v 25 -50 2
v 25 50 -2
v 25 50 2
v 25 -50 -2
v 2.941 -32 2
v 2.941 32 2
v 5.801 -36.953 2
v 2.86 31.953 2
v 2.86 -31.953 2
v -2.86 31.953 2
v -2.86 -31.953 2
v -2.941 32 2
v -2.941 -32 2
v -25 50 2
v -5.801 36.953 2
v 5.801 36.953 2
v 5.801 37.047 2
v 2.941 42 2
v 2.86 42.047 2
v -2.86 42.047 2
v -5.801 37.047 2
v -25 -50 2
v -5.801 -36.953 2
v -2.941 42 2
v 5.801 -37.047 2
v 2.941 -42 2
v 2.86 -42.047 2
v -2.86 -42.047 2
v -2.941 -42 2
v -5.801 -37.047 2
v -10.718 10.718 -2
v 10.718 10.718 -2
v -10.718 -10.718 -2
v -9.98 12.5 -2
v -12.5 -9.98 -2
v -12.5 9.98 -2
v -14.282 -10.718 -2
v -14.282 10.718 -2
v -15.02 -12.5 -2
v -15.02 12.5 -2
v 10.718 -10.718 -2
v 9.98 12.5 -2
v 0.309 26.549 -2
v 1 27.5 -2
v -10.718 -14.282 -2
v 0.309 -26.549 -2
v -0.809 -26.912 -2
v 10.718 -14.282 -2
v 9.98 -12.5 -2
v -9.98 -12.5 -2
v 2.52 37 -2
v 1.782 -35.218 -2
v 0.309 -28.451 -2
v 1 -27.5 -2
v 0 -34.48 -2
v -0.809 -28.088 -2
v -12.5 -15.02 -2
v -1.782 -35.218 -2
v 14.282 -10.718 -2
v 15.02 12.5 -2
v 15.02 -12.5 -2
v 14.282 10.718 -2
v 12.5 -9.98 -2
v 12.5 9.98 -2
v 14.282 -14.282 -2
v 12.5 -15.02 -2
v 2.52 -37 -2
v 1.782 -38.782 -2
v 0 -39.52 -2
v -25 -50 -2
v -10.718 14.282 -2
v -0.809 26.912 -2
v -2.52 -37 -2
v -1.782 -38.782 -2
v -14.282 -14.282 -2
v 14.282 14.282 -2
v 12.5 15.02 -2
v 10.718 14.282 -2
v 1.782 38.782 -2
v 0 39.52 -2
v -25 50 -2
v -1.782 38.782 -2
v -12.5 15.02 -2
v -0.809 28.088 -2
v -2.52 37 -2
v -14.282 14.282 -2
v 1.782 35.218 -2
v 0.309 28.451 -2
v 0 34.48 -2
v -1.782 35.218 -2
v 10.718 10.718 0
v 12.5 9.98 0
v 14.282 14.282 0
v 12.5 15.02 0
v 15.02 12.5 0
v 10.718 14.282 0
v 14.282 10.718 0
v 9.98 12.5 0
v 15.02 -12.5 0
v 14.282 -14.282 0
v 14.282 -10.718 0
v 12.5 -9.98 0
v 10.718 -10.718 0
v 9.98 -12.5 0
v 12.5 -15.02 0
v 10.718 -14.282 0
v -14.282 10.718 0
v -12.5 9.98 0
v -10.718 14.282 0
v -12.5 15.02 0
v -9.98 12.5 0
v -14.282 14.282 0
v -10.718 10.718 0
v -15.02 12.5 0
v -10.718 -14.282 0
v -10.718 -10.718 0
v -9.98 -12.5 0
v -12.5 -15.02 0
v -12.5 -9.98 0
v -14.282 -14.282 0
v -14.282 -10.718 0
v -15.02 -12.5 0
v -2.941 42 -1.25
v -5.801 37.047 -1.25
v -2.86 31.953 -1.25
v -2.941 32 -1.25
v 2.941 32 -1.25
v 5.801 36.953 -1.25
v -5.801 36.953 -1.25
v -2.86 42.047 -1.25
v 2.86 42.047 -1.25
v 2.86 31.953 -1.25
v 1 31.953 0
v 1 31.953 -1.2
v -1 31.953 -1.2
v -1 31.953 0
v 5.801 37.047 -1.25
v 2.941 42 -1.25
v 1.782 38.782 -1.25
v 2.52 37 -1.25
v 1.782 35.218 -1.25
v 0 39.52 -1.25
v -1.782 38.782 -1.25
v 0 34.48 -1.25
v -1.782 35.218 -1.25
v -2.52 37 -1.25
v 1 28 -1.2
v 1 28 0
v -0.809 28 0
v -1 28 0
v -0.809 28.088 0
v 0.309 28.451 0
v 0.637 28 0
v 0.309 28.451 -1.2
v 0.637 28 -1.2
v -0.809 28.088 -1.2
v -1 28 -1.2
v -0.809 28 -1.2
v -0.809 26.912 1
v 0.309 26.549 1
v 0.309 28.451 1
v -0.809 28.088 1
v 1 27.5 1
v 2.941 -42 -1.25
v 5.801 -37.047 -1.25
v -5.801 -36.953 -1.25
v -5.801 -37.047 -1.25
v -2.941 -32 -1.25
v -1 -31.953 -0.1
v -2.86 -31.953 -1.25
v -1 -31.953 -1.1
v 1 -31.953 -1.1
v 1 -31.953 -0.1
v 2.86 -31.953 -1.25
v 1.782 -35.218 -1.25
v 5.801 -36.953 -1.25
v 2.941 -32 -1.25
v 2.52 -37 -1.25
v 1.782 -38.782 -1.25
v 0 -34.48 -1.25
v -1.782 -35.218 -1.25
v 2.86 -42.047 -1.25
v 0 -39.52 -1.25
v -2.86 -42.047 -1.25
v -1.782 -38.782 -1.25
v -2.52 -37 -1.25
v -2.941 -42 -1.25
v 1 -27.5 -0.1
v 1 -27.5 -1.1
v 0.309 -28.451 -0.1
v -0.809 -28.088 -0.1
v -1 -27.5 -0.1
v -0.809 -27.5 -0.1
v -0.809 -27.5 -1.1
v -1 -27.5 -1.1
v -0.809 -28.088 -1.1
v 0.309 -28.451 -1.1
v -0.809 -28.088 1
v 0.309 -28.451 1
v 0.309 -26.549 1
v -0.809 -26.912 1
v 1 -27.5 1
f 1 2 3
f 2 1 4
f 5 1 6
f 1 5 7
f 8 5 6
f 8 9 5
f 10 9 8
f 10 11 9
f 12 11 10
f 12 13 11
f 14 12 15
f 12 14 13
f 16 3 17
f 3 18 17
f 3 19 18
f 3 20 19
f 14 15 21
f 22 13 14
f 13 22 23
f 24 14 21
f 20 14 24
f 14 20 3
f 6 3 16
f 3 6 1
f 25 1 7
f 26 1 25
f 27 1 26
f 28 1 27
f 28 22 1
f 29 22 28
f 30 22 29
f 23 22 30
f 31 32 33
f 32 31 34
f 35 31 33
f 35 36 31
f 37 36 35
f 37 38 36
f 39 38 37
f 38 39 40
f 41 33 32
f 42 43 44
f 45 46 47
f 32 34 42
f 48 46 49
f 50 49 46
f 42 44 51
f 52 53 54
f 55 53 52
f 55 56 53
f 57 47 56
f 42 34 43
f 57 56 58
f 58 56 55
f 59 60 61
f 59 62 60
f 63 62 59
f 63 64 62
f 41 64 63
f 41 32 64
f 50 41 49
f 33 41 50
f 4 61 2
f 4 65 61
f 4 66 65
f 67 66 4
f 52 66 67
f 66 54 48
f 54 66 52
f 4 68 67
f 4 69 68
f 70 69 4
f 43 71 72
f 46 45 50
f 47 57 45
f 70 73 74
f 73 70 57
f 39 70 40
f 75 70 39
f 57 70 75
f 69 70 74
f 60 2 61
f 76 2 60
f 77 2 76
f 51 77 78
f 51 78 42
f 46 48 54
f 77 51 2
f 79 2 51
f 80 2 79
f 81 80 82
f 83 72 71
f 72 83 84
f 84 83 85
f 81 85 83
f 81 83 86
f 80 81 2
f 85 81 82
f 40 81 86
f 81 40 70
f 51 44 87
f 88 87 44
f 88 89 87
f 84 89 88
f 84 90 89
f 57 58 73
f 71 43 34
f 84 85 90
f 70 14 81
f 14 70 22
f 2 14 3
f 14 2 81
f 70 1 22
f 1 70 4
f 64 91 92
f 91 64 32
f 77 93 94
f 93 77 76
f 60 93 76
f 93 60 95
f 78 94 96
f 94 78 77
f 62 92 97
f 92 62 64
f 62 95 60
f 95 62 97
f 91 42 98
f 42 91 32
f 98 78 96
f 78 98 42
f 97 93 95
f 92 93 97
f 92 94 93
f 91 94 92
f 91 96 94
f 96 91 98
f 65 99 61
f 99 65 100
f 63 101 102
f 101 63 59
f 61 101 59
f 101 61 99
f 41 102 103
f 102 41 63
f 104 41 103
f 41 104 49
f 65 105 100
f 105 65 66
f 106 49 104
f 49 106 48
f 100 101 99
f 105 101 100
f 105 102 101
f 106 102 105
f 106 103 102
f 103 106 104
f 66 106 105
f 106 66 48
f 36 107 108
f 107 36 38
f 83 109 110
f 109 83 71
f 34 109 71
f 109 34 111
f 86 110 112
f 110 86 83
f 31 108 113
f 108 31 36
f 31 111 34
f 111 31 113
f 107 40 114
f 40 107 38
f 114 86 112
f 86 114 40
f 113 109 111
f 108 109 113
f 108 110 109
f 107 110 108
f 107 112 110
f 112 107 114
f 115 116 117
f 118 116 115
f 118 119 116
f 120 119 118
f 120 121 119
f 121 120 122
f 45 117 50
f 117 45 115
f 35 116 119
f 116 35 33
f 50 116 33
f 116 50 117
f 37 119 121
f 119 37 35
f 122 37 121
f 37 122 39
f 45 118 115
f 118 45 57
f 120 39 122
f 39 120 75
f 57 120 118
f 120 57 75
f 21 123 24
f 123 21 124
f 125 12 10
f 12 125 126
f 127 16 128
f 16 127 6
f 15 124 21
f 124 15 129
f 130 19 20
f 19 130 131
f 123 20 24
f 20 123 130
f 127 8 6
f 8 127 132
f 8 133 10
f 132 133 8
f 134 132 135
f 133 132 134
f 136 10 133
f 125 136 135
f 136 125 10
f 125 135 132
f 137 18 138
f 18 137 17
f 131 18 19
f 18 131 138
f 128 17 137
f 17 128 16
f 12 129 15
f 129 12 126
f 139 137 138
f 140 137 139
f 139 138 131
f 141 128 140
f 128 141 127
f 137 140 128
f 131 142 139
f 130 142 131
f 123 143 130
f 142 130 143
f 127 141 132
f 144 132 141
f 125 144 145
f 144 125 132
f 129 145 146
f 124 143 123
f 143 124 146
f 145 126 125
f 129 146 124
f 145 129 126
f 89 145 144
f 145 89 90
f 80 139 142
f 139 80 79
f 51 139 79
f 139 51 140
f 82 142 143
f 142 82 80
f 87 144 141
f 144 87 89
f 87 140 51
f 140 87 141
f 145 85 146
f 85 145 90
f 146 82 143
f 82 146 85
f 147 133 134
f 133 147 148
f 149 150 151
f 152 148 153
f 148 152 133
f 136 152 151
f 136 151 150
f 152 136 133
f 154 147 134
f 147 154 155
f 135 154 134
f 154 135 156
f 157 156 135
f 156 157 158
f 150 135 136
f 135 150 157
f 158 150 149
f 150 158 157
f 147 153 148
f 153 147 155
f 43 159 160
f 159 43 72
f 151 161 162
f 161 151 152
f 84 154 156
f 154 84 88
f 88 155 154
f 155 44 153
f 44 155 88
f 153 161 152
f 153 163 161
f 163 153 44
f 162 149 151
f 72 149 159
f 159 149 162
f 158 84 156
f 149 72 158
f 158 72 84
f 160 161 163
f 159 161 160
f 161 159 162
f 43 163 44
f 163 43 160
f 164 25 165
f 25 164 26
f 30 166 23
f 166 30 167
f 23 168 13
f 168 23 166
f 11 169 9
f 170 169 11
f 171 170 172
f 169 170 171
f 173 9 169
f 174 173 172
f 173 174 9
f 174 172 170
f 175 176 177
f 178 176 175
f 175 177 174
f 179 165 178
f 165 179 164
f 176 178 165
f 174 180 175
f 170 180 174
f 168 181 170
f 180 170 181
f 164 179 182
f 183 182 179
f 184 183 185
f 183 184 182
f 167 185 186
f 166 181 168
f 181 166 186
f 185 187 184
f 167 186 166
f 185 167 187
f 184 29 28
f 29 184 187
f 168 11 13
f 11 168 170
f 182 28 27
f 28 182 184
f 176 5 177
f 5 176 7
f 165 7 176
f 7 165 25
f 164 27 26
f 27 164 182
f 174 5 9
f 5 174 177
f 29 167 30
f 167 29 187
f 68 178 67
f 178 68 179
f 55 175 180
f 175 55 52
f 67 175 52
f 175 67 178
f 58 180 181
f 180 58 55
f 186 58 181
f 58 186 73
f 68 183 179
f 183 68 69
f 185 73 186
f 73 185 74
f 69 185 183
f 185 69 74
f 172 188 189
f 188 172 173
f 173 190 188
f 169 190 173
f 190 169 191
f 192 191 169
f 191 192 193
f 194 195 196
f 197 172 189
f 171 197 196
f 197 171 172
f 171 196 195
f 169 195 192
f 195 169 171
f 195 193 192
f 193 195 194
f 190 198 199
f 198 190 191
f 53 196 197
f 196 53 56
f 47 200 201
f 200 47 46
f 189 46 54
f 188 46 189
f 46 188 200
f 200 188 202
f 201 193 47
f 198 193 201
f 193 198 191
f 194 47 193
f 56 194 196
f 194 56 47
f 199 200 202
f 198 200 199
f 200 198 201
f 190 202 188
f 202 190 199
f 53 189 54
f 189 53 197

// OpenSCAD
module phex(wid,rad,height){
hull(){
translate([wid/2-rad,0,0])cylinder(r=rad,h=height);
rotate([0,0,60])translate([wid/2-rad,0,0])cylinder(r=rad,h=height);
rotate([0,0,120])translate([wid/2-rad,0,0])cylinder(r=rad,h=height);
rotate([0,0,180])translate([wid/2-rad,0,0])cylinder(r=rad,h=height);
rotate([0,0,240])translate([wid/2-rad,0,0])cylinder(r=rad,h=height);
rotate([0,0,300])translate([wid/2-rad,0,0])cylinder(r=rad,h=height);

}
}

module fhex(wid,height){
hull(){
cube([wid/1.7,wid,height],center = true);
rotate([0,0,120])cube([wid/1.7,wid,height],center = true);
rotate([0,0,240])cube([wid/1.7,wid,height],center = true);
}
}




difference(){
cube([50
,100,4],center=true);

translate([12.5,12.5,-2.5])
cylinder(h=5+0.001,r=5.04/2,center=true);

translate([12.5,-12.5,-2.5])
cylinder(h=5+0.001,r=5.04/2,center=true);

translate([-12.5,12.5,-2.5])
cylinder(h=5+0.001,r=5.04/2,center=true);

translate([-12.5,-12.5,-2.5])
cylinder(h=5+0.001,r=5.04/2,center=true);

//hexagono superior 
translate([0,37,1.2])
fhex(10,5-0.1);
//hueco para bulon concentrico a hexagono
translate([0,37,1.5])
cylinder(h=8+0.001,r=5.04/2,center=true);
//hueco rectangular 37mm-5(ancho de hexagono)-largo/2 de hueco
translate([0,32-4/2,-1.2/2])
color([1,0,1])cube([2
,4,1.2],center=true);
// Cilindro al final del hueco 32-Ltotal-radio/2
translate([0,32-4-1/2,-1])
cylinder(h=4+0.001,r=1,center=true);

//hexagono inferior

translate([0,-37,1.2])
fhex(10,5-0.1);

translate([0,-37,1.5])
cylinder(h=8+0.001,r=5.04/2,center=true); 

translate([0,-32+4/2,-1.2/2])
color([1,0,0])cube([2
,5,1],center=true);

translate([0,-32+4+1/2,-1])
cylinder(h=4+0.001,r=1,center=true);

}

//color([100,0,1])cube([300,300,4-1], center=true);
